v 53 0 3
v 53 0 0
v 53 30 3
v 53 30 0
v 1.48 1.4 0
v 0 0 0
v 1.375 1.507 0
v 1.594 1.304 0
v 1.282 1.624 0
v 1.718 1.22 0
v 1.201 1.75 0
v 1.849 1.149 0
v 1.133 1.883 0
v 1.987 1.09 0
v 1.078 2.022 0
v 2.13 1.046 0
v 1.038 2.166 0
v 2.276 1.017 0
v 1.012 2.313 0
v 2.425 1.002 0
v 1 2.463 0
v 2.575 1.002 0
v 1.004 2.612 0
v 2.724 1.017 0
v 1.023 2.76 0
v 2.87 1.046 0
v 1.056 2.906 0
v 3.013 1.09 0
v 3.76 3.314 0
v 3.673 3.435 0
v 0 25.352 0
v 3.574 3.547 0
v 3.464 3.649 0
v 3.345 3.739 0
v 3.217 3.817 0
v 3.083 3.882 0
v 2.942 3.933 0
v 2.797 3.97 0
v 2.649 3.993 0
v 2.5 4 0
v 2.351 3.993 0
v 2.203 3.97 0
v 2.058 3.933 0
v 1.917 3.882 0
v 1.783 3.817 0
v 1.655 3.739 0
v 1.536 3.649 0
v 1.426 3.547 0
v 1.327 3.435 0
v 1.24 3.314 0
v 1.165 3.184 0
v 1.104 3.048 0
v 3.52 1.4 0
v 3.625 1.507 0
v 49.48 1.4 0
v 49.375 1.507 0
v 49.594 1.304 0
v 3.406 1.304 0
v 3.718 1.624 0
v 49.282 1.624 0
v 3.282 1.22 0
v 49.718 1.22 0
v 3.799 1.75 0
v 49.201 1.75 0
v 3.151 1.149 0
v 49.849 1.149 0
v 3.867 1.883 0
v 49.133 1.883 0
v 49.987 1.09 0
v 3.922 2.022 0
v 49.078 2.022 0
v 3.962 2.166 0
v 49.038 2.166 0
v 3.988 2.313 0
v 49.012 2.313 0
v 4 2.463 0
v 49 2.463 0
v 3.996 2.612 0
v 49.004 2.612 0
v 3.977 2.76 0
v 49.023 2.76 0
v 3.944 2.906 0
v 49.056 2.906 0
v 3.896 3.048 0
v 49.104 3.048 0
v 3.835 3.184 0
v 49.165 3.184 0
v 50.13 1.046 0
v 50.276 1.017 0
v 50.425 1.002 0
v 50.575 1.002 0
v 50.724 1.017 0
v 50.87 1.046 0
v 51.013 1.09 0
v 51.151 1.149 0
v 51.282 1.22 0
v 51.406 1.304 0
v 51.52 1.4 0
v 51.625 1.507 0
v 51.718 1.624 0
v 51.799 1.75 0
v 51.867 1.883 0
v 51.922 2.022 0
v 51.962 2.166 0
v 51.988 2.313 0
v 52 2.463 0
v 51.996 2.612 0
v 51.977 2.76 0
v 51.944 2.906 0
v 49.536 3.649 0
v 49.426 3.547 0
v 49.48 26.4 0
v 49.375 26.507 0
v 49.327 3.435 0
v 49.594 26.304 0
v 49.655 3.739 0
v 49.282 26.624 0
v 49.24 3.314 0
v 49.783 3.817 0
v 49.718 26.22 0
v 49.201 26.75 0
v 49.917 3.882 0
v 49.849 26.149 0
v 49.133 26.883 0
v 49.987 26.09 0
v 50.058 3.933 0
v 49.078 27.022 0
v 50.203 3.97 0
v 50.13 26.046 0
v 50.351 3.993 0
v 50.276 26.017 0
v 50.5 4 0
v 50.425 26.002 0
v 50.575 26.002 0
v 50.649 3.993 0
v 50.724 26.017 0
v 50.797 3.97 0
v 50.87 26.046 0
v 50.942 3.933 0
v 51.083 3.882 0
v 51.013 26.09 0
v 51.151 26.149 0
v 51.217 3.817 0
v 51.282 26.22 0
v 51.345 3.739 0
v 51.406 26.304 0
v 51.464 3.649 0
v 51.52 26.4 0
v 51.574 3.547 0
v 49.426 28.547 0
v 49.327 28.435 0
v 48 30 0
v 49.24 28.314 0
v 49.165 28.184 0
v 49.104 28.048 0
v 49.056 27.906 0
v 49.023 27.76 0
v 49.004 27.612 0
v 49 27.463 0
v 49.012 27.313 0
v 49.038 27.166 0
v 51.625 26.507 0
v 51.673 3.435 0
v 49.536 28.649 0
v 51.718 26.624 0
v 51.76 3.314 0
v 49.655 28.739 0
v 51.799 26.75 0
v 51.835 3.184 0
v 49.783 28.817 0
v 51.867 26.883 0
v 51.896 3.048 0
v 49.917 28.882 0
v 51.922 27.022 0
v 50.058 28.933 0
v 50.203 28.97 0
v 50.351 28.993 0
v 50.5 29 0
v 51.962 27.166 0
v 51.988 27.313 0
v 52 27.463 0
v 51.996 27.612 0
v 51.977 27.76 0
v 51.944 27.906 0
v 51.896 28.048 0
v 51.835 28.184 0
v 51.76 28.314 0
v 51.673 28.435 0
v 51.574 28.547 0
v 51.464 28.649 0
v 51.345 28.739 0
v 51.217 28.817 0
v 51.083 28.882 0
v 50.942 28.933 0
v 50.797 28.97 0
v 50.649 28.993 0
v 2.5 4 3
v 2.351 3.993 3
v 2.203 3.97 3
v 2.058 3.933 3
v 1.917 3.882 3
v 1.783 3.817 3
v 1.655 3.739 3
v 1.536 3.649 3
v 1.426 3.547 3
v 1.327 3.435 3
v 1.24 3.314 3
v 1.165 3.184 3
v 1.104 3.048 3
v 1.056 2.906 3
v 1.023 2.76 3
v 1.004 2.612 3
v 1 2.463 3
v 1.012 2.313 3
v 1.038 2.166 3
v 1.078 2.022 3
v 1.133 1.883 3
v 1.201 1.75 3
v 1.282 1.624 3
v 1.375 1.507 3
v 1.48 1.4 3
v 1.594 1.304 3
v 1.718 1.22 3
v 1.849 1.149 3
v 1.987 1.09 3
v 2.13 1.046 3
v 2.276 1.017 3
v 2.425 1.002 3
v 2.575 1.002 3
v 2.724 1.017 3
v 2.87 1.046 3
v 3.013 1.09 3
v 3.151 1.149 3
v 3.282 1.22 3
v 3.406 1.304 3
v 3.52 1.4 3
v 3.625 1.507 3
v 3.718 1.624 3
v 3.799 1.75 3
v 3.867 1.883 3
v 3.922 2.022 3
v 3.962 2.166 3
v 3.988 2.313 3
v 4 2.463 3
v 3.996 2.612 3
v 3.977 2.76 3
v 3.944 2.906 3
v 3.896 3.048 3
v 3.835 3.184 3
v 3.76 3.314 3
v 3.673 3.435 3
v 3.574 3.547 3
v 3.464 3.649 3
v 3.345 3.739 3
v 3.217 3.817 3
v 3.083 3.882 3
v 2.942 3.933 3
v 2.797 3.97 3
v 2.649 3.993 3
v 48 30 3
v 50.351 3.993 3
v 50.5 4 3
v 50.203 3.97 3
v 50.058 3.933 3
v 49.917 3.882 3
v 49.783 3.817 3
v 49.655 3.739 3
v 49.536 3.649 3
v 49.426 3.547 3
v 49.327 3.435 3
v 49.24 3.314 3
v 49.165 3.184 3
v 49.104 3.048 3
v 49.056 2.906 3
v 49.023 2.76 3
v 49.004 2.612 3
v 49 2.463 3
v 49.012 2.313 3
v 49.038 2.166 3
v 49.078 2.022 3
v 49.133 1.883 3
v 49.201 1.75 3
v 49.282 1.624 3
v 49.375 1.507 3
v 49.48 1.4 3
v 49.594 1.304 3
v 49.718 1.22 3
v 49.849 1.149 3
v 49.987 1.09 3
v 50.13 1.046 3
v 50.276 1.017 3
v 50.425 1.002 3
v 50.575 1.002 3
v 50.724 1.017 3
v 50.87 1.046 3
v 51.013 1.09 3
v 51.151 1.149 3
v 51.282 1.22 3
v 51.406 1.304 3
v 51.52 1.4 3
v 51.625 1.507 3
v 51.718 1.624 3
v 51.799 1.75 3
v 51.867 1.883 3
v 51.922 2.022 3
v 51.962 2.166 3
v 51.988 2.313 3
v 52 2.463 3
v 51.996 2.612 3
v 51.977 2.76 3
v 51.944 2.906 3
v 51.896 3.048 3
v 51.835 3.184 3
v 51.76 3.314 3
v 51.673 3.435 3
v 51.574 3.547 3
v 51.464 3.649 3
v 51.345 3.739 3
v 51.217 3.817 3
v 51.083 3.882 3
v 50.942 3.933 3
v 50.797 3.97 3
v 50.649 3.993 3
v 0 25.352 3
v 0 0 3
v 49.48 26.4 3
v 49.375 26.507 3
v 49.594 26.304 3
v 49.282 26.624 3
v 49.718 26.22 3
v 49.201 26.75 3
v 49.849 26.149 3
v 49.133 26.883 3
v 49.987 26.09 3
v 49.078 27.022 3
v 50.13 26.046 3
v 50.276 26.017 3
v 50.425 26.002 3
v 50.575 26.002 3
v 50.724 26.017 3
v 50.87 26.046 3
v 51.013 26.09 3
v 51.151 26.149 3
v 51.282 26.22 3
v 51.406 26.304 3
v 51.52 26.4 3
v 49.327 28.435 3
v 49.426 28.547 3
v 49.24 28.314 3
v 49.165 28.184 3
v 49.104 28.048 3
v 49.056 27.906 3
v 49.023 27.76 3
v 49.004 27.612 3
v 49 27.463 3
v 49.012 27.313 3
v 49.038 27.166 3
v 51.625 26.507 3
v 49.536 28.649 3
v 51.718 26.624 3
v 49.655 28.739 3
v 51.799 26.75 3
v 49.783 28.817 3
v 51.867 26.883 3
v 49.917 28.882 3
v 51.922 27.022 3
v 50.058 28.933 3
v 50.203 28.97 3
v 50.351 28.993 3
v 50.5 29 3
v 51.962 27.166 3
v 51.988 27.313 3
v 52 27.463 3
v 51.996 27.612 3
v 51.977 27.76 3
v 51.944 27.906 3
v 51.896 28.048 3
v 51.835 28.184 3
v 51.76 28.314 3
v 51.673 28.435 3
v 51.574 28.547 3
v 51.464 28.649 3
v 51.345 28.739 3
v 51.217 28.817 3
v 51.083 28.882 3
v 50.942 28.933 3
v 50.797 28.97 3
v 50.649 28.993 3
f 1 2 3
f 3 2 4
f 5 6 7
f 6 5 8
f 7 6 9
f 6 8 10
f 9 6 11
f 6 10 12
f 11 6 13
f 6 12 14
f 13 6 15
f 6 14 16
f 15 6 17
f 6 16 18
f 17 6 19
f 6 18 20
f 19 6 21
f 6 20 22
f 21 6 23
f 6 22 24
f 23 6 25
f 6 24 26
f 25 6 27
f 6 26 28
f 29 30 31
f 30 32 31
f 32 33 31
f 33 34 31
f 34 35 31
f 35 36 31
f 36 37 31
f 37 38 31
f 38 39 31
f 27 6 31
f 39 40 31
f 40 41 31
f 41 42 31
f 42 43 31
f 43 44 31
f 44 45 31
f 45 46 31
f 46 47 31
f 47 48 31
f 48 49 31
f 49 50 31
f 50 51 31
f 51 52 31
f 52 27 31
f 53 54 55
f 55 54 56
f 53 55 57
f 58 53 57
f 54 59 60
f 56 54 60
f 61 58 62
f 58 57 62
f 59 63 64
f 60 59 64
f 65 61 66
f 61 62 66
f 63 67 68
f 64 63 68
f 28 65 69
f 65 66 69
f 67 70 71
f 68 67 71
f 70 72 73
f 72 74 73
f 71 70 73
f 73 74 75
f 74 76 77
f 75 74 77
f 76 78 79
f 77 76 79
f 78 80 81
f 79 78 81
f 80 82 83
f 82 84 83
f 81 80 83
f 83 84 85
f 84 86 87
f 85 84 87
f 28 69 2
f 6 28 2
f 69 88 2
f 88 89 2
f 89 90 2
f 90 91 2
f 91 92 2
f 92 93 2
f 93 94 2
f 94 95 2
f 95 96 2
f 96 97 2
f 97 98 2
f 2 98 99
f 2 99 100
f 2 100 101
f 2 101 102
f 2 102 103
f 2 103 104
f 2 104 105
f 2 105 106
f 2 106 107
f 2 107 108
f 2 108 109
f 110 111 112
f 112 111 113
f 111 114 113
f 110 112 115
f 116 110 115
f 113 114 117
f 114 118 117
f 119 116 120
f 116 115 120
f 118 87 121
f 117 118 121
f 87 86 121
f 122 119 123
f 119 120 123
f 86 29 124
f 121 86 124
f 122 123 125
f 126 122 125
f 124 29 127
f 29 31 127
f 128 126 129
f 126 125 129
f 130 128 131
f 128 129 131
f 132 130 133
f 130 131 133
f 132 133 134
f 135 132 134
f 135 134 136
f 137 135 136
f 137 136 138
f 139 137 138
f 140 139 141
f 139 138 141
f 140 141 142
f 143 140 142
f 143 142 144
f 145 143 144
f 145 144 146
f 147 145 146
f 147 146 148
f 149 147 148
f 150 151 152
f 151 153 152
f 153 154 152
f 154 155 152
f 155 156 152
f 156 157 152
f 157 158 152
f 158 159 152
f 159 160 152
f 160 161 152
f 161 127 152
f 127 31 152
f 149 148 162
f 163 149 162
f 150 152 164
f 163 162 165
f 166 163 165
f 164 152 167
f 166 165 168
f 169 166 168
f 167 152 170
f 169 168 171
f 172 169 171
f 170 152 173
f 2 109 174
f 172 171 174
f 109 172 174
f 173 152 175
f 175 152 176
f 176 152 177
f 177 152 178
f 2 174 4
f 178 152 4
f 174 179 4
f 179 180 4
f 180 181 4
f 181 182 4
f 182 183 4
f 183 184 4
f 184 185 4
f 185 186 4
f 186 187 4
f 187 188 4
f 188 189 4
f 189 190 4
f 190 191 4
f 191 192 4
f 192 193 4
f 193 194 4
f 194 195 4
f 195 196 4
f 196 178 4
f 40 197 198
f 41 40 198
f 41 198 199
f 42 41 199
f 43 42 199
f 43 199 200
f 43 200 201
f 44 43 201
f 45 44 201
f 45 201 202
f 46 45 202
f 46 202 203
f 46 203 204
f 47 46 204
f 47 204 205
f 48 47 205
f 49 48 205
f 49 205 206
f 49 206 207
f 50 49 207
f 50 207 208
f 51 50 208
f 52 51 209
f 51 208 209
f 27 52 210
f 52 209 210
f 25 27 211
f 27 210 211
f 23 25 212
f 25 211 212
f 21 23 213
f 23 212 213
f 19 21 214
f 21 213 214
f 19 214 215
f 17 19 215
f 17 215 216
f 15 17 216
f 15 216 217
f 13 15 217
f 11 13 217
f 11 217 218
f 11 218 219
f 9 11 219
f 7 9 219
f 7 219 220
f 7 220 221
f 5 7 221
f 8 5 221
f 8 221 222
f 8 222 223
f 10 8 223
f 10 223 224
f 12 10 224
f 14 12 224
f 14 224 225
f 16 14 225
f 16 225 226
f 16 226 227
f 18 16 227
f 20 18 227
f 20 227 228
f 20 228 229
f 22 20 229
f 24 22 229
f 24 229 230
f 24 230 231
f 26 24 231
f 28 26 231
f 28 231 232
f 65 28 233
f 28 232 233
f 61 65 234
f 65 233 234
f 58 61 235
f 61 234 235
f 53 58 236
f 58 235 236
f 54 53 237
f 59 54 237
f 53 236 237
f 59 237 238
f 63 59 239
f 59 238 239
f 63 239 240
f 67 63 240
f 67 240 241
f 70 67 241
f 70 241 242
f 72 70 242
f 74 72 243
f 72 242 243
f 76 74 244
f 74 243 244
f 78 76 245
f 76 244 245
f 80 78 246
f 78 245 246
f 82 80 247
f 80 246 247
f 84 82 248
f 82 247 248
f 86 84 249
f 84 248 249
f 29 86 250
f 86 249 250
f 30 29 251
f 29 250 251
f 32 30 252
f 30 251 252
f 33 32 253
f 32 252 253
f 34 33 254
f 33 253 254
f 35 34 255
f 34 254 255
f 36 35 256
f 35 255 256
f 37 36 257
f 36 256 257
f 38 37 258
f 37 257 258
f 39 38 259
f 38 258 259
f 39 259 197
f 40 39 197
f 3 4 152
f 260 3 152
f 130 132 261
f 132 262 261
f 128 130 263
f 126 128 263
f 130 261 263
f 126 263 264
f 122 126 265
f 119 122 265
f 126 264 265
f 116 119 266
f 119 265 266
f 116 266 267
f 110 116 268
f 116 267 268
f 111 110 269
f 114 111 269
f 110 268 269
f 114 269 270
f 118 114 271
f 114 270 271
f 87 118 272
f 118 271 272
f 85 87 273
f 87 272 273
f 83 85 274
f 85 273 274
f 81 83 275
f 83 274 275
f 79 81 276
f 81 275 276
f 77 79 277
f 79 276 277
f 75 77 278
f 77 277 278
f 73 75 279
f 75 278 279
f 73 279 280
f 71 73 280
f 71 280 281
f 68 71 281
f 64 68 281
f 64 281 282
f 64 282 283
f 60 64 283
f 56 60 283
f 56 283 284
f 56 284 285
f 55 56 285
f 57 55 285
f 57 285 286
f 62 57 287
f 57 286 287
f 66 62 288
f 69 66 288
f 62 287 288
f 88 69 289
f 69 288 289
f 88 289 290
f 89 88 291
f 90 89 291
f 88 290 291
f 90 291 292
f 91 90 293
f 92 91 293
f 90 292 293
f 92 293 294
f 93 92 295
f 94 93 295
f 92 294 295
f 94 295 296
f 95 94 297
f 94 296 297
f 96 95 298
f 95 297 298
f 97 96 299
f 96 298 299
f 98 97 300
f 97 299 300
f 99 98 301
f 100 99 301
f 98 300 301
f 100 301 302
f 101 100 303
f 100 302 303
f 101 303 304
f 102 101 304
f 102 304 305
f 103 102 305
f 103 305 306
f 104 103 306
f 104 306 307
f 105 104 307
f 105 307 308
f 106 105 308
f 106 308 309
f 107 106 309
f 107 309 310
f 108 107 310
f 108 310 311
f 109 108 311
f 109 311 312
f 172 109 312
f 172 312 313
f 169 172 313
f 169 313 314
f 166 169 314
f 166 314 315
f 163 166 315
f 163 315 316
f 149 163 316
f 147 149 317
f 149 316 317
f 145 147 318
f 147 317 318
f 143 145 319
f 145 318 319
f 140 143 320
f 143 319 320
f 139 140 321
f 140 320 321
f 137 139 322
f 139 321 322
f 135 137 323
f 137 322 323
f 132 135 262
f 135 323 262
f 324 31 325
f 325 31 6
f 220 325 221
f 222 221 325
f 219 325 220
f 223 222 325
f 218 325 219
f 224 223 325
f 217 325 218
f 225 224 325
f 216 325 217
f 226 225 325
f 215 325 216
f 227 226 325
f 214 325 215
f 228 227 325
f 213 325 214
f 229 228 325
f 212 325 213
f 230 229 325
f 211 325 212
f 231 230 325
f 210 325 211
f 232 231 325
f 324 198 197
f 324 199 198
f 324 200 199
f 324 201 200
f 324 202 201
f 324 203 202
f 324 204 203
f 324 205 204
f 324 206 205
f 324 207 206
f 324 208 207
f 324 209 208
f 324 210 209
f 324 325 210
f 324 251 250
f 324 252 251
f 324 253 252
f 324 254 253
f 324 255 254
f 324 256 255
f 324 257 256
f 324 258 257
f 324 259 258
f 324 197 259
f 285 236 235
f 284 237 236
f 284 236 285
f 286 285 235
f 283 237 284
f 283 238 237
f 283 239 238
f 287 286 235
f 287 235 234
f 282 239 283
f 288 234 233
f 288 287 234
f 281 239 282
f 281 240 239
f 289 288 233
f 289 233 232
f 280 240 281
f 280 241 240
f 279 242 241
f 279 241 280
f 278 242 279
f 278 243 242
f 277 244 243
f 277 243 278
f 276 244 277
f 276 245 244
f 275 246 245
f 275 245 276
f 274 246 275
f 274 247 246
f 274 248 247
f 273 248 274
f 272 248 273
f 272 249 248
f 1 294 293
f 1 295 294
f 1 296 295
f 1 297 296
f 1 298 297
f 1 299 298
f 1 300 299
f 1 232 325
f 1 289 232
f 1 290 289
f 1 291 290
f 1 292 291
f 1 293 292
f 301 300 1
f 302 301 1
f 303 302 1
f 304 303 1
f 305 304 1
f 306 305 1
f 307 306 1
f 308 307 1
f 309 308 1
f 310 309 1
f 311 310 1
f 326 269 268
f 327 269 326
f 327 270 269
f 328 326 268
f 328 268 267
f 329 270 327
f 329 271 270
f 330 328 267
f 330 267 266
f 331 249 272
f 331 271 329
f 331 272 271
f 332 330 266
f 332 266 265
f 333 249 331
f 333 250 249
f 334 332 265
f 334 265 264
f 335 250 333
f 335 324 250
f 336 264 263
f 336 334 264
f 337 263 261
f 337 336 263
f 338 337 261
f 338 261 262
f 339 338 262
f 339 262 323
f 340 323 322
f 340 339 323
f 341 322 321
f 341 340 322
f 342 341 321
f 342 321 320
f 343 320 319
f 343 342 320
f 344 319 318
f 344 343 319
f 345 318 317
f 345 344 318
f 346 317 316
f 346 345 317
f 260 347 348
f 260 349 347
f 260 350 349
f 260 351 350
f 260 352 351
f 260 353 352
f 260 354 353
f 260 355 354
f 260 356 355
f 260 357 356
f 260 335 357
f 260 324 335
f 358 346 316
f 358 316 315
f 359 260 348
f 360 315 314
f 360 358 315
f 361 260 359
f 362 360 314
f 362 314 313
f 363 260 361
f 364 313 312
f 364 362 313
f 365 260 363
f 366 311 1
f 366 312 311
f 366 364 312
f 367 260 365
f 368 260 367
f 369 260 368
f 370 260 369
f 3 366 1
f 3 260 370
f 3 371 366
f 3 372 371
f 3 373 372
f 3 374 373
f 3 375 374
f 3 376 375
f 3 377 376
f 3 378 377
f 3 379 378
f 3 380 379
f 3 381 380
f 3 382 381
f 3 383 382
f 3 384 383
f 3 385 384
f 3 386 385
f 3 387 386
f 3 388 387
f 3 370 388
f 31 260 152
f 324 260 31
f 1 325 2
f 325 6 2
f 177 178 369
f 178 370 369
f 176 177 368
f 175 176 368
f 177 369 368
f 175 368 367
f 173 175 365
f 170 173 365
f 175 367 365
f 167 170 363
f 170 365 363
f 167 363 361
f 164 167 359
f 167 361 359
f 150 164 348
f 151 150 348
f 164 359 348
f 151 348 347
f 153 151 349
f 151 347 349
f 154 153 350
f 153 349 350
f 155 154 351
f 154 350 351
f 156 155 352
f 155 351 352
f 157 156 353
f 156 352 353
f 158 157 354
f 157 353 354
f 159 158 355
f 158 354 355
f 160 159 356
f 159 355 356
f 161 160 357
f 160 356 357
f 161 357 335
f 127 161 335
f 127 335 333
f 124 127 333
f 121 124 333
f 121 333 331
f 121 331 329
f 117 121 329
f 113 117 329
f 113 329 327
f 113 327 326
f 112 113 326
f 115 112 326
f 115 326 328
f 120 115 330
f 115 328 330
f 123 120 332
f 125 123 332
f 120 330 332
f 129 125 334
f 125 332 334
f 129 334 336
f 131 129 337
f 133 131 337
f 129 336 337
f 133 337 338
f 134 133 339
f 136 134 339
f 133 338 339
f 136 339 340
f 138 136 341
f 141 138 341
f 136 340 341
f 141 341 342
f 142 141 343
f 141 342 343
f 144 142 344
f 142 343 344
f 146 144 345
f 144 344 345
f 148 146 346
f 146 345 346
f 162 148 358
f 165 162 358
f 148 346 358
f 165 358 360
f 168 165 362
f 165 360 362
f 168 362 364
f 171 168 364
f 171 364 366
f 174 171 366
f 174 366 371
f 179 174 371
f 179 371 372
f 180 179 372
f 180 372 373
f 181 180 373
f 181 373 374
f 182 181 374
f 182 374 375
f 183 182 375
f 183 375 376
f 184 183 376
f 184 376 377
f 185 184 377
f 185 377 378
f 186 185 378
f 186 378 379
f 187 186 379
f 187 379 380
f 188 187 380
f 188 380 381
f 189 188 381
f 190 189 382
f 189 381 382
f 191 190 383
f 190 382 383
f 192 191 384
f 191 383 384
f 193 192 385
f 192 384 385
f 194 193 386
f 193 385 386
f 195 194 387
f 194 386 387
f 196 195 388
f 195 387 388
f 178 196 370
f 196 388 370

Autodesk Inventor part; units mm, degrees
ref_plane "YZ Plane" through (0, 0, 0) normal (1, 0, 0) x (0, 1, 0)
ref_plane "XZ Plane" through (0, 0, 0) normal (0, 1, 0) x (-1, 0, 0)
ref_plane "XY Plane" through (0, 0, 0) normal (0, 0, 1) x (1, 0, 0)
sketch "Sketch1" plane through (0, 0, 0) normal (0, 0, 1) x (1, 0, 0)
  line L0 (0, 0) -> (53, 0)
  line L1 (53, 0) -> (53, 30)
  line L2 (53, 30) -> (0, 30)
  line L3 (0, 30) -> (0, 0)
  point P0 (2.5, 2.5)
  point P1 (50.5, 2.5)
  point P2 (50.5, 27.5)
  dimension "d0" = 53
  dimension "d1" = 30
extrude "Extrusion1" add sketch "Sketch1" along normal blind 3
hole "Hole1" at (2.5, 2.5, 0) at (50.5, 2.5, 0) at (50.5, 27.5, 0) direction (0, 0, 1) diameter 3 end through all
sketch "Sketch2" plane through (0, 0, 3) normal (0, 0, 1) x (1, 0, 0)
  line L0 (53, 0) -> (53, 30) projected
  line L1 (53, 30) -> (48, 30)
  line L2 (53, 30) -> (0, 30) projected
  line L3 (48, 30) -> (0, 25.3519)
  line L4 (0, 30) -> (0, 0) projected
  line L5 (0, 30) -> (48, 30)
  dimension "d11" = 5
extrude "Extrusion2" cut sketch "Sketch2" against normal through all
properties part number "head-sideplate" material "Aluminum 6061"
